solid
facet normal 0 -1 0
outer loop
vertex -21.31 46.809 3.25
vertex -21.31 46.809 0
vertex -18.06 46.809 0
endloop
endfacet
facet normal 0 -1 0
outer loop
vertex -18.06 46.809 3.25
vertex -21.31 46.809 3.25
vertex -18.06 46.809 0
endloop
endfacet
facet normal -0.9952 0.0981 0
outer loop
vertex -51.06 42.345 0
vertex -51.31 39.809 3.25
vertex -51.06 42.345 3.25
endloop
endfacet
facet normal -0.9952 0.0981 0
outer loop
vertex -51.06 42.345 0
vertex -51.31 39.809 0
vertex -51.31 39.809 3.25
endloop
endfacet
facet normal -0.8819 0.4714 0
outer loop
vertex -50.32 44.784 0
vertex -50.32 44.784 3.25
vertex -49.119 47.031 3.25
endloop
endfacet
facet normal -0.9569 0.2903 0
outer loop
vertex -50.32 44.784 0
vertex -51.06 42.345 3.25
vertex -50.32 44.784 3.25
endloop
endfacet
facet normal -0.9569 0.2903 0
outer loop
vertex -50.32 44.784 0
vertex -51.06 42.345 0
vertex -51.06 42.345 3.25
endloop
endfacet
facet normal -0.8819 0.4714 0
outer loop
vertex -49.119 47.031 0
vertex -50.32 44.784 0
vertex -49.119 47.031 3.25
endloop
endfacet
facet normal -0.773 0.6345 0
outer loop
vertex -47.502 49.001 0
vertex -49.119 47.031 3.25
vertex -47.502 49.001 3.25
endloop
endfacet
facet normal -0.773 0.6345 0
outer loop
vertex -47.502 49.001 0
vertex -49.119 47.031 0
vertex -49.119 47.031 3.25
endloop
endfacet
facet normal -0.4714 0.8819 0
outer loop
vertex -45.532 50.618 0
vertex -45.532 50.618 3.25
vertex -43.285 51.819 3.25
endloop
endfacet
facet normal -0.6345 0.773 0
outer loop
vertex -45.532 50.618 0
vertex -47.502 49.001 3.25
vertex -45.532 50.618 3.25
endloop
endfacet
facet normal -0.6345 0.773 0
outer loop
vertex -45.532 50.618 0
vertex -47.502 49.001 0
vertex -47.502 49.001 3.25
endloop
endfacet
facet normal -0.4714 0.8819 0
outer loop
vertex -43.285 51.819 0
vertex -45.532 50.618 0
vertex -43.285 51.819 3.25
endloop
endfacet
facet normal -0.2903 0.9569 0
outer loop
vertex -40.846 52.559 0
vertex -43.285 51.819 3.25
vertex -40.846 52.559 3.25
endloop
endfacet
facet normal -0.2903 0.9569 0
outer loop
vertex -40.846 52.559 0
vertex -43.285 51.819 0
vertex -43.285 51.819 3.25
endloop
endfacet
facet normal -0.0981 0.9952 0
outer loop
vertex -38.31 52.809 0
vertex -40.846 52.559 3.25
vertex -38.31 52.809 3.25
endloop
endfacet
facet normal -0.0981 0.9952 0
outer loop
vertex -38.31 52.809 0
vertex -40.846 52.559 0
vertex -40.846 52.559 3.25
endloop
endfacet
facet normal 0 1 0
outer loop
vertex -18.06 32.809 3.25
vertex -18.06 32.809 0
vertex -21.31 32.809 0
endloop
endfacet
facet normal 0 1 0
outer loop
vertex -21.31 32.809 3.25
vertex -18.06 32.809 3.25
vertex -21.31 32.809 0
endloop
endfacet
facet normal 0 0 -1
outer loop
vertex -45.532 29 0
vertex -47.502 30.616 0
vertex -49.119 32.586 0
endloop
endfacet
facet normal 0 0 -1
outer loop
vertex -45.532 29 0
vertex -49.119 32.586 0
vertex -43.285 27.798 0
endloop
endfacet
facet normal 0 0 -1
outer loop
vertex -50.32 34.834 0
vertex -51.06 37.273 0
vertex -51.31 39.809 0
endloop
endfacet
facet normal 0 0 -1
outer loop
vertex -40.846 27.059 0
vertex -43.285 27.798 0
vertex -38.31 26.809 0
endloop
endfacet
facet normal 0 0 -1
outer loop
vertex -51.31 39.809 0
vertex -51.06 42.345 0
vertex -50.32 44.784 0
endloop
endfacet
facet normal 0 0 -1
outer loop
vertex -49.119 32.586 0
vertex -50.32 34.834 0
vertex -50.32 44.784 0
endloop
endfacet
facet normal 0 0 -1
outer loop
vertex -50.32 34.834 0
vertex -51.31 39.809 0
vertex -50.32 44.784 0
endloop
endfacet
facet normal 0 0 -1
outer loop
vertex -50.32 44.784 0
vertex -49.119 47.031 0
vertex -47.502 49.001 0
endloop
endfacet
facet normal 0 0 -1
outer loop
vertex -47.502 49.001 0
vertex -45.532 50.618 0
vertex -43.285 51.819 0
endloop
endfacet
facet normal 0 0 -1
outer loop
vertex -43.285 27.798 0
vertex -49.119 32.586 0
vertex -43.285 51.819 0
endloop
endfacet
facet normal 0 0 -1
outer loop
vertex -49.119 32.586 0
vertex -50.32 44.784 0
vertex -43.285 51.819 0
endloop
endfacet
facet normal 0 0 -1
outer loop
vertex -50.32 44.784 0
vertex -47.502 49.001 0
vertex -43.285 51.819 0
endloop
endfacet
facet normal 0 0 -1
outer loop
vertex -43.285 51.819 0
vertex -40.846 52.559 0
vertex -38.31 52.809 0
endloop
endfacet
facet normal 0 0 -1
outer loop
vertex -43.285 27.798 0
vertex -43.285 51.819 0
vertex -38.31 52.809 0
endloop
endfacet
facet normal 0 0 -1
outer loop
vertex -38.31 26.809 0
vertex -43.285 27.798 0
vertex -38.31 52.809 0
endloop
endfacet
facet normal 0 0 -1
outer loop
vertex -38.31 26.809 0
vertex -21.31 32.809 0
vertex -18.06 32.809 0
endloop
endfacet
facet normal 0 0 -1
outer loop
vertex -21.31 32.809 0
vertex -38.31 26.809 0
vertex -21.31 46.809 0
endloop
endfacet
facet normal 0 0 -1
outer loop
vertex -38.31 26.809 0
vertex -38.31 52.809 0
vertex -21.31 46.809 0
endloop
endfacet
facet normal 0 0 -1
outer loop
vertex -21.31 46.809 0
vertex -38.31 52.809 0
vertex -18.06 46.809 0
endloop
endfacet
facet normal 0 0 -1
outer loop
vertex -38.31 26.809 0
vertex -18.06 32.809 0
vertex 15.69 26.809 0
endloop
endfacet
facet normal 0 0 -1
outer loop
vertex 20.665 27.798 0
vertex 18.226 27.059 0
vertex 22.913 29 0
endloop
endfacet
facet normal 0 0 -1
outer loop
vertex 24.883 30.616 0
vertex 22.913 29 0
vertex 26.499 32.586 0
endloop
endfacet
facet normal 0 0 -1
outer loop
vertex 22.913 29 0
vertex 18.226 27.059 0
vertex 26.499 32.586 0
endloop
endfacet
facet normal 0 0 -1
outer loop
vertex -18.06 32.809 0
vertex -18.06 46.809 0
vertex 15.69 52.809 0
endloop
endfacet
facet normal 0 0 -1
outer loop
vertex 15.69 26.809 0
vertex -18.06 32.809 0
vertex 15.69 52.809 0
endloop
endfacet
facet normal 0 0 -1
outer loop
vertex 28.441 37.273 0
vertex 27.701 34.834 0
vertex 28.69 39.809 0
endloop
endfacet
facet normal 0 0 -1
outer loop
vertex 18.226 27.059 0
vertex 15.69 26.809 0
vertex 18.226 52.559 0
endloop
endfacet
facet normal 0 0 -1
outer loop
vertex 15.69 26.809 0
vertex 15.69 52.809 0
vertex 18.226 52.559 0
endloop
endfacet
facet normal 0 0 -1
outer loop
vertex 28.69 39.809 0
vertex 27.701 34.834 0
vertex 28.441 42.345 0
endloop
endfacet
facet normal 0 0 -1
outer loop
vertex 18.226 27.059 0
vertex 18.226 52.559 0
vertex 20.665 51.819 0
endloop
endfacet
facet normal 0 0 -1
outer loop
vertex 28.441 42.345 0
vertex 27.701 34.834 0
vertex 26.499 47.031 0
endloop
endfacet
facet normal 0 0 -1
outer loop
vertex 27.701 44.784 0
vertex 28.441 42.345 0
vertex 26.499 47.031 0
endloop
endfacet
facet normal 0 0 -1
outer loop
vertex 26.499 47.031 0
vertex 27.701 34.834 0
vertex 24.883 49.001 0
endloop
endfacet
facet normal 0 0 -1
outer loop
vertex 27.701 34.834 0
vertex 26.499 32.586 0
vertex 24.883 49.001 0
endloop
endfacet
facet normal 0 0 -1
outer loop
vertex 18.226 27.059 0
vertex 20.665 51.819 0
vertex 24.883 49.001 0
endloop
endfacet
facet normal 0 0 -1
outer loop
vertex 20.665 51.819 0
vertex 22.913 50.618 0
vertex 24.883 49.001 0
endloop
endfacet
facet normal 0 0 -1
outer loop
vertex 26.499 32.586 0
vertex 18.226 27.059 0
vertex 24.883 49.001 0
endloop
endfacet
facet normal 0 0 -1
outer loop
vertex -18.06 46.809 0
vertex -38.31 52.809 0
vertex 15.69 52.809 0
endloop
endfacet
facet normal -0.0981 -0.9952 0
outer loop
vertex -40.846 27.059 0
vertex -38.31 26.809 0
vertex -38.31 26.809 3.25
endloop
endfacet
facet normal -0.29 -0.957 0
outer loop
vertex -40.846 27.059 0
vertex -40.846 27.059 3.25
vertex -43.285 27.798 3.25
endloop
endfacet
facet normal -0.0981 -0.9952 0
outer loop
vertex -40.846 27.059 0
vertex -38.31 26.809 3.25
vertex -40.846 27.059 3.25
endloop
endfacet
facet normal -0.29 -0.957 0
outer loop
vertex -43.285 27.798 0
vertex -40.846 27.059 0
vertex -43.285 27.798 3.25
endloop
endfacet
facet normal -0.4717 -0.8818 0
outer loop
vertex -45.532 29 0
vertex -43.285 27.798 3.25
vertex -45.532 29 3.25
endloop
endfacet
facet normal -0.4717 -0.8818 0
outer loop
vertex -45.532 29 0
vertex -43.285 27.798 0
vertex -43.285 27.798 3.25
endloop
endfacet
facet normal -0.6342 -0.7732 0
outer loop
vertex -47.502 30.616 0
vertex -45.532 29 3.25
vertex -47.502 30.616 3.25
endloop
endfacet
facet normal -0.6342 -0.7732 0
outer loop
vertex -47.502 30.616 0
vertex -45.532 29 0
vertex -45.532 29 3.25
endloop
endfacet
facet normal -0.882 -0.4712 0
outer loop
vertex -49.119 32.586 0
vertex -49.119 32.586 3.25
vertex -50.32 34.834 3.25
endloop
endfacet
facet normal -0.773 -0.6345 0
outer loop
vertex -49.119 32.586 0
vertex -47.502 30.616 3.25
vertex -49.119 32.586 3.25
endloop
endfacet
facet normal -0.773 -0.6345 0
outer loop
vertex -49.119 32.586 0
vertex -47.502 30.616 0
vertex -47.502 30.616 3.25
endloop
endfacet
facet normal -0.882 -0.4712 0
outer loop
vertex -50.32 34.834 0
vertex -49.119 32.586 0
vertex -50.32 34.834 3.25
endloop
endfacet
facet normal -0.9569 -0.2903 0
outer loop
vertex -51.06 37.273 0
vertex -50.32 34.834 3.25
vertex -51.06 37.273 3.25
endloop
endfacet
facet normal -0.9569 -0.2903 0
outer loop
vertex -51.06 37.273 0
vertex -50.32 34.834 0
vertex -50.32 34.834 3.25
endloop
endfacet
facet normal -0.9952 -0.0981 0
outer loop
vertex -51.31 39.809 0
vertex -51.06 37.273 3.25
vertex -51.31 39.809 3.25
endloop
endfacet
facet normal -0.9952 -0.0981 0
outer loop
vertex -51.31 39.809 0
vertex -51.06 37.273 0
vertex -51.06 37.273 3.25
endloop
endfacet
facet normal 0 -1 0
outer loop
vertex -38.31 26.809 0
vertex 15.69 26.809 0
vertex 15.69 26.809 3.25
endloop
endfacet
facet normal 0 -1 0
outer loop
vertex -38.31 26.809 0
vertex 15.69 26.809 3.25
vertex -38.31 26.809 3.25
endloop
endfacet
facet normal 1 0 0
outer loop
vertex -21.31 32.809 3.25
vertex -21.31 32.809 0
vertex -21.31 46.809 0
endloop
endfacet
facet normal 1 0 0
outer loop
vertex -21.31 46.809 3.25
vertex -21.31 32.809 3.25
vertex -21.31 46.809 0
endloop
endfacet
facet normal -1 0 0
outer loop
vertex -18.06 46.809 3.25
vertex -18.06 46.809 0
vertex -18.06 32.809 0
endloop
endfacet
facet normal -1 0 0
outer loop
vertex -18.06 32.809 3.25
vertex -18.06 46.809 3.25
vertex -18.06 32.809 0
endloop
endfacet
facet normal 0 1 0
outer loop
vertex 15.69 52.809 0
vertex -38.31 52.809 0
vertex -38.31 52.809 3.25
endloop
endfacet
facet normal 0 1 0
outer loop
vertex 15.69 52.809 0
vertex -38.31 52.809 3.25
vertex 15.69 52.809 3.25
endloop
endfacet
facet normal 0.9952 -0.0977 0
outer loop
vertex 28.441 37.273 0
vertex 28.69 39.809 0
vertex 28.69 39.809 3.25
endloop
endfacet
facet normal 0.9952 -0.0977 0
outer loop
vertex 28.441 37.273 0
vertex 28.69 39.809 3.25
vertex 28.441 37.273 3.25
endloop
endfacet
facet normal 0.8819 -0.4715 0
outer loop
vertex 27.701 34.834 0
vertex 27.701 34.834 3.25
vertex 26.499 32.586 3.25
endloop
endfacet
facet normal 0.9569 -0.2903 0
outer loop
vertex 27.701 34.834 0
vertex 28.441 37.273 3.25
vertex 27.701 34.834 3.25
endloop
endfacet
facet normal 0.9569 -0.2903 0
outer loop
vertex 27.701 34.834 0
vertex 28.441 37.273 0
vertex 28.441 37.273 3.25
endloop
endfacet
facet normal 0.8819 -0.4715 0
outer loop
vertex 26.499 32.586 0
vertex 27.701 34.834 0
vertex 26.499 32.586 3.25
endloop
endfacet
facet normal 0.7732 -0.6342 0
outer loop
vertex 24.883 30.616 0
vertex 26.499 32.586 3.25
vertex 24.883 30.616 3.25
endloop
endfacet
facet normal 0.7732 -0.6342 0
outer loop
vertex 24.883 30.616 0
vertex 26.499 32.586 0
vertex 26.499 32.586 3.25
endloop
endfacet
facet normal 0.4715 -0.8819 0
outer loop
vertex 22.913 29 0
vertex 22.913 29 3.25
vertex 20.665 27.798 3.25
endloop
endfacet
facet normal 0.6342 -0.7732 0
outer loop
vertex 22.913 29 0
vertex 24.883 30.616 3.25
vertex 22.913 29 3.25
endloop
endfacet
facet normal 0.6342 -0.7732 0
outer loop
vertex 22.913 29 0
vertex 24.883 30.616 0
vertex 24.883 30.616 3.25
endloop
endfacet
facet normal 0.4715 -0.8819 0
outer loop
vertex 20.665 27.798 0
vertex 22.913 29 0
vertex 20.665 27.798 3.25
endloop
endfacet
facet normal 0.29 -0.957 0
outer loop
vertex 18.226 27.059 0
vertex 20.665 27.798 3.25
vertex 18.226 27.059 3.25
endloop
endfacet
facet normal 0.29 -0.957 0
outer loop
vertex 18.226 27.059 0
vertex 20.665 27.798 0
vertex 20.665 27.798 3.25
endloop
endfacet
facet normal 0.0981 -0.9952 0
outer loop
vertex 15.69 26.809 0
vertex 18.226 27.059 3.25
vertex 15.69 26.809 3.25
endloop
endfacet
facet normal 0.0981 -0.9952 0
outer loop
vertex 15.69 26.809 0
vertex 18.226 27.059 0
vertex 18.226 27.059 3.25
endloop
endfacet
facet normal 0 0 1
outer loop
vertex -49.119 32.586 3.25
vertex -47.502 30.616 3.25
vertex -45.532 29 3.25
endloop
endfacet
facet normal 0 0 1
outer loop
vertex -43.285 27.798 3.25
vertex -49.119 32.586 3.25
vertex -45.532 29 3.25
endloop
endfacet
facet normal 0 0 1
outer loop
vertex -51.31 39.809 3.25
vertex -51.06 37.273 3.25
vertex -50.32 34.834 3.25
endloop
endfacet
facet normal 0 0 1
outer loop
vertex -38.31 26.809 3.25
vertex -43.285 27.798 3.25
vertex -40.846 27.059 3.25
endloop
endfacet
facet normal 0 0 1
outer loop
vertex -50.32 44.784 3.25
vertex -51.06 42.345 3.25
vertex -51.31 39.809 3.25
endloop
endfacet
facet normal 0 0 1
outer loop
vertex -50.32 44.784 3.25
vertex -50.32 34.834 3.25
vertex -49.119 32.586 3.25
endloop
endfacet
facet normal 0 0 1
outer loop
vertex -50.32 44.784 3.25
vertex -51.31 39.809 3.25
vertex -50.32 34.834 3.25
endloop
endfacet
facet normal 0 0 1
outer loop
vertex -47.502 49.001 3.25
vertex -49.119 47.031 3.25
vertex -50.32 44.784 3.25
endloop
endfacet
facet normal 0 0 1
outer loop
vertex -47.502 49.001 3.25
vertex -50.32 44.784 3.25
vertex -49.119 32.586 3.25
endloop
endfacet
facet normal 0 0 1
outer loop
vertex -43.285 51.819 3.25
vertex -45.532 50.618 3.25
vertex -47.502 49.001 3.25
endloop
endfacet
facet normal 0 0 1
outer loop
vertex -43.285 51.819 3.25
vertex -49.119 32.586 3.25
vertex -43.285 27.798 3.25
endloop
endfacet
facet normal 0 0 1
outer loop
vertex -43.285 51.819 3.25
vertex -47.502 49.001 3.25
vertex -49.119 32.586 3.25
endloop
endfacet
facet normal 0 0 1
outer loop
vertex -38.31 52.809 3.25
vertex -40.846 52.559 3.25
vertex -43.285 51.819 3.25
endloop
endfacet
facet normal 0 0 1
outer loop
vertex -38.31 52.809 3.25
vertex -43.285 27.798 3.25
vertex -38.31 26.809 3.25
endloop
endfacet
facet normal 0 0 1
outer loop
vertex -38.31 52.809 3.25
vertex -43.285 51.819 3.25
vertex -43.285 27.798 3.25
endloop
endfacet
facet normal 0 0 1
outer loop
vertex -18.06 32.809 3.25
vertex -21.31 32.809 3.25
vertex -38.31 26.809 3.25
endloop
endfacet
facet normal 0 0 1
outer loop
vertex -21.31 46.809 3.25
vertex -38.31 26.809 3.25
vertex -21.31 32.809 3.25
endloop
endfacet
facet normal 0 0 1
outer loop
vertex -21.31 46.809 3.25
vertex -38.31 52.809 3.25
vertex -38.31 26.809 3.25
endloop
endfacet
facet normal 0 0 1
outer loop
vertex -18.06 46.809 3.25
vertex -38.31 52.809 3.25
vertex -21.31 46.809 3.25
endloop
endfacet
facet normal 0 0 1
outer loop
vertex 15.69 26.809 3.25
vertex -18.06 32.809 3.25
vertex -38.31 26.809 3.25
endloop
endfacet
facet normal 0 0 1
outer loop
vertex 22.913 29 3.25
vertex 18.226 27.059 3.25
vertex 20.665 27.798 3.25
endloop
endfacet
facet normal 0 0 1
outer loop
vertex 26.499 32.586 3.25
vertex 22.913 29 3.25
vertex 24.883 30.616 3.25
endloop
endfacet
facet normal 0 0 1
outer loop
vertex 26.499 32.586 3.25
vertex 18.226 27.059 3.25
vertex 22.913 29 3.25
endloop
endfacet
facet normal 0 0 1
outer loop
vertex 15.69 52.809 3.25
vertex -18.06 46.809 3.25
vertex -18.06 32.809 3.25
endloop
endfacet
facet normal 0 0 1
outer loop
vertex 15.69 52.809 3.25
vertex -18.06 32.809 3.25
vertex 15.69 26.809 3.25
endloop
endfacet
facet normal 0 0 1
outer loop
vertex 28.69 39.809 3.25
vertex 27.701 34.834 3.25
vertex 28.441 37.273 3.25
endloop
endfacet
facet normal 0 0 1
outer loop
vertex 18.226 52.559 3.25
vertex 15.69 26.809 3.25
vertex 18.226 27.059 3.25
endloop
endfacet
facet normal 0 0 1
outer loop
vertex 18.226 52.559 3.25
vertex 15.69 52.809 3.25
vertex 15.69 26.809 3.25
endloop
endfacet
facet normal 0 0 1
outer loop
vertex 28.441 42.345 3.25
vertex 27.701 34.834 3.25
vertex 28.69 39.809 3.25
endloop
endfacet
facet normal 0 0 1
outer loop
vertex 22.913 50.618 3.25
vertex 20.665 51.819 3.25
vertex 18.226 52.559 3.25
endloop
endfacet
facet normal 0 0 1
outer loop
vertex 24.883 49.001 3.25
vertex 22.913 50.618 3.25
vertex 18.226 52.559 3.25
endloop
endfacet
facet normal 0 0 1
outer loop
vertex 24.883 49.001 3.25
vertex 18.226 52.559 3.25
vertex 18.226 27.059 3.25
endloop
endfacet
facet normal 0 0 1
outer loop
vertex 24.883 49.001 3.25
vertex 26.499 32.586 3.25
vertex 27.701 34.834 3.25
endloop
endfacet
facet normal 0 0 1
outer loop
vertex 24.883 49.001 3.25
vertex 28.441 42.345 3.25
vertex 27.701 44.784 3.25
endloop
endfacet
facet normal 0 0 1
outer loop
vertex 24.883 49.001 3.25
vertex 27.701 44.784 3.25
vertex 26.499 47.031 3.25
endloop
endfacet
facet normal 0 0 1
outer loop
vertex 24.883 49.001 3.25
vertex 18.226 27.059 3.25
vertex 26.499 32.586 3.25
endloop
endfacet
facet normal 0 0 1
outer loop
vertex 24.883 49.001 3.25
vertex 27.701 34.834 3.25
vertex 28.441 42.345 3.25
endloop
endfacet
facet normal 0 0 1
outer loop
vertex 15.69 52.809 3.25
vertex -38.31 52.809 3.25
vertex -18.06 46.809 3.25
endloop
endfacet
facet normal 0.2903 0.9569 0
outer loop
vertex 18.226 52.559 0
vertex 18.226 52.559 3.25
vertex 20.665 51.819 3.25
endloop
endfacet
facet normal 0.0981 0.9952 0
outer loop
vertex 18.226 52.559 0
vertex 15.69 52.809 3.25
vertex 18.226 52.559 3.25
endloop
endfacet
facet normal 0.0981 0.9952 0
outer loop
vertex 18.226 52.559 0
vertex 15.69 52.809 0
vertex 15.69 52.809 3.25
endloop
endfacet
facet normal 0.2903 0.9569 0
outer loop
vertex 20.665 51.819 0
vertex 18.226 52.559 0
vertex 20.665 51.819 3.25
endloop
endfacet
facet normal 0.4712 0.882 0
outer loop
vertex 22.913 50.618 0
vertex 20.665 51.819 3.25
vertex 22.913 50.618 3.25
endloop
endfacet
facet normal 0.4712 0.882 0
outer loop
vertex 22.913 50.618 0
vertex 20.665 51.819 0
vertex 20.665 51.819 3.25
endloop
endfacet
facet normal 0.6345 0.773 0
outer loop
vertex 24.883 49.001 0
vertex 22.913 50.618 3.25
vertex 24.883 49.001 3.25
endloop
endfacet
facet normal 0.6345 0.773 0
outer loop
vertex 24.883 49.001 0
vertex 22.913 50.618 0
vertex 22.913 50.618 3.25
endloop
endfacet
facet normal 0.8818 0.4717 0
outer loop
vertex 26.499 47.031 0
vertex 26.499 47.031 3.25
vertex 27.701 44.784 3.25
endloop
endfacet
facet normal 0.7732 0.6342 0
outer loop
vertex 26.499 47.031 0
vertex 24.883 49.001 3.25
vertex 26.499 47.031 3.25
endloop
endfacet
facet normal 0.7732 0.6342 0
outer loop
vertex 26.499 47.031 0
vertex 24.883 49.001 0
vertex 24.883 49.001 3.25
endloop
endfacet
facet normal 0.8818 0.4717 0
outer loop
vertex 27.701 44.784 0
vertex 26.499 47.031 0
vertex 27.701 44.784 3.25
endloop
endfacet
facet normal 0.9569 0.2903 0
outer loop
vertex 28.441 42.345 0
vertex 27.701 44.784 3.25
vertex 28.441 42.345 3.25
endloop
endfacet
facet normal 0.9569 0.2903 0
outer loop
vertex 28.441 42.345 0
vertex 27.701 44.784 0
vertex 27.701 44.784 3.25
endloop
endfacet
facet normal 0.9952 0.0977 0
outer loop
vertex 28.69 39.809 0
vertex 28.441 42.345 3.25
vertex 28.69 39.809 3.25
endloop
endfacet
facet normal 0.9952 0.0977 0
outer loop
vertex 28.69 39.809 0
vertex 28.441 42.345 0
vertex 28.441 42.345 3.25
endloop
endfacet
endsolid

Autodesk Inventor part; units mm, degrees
ref_plane "YZ Plane" through (0, 0, 0) normal (1, 0, 0) x (0, 1, 0)
ref_plane "XZ Plane" through (0, 0, 0) normal (0, 1, 0) x (-1, 0, 0)
ref_plane "XY Plane" through (0, 0, 0) normal (0, 0, 1) x (1, 0, 0)
sketch "Block1" plane through (0, 0, 0) normal (0, 0, 1) x (1, 0, 0)
  circle A0 centre (74.029, 24.2723) radius 1
  line L0 (49.279, 30.4723) -> (71.779, 30.4723)
  line L1 (71.779, 30.4723) -> (71.779, 18.0723)
  line L2 (71.779, 18.0723) -> (49.279, 18.0723)
  line L3 (49.279, 18.0723) -> (49.279, 30.4723)
  line L4 (49.279, 30.4723) -> (44.779, 30.4723)
  line L5 (44.779, 30.4723) -> (44.779, 18.0723)
  line L6 (44.779, 18.0723) -> (49.279, 18.0723)
  line L7 (49.279, 18.0723) -> (49.279, 30.4723)
  line L8 (71.779, 30.4723) -> (76.279, 30.4723)
  line L9 (76.279, 30.4723) -> (76.279, 18.0723)
  line L10 (76.279, 18.0723) -> (71.779, 18.0723)
  line L11 (71.779, 18.0723) -> (71.779, 30.4723)
  line L12 (44.779, 24.2723) -> (76.279, 24.2723) construction
  line L13 (47.029, 30.4723) -> (47.029, 18.0723) construction
  circle A1 centre (47.029, 24.2723) radius 1
  line L14 (74.029, 30.4723) -> (74.029, 18.0723) construction
  point P0 (60.979, 24.0984)
  dimension "d7" = 22.5
  dimension "d8" = 12.4
  dimension "d9" = 4.5
  dimension "d10" = 4.5
  dimension "d11" = 2
  dimension "d12" = 2
sketch "Sketch1" plane through (0, 0, 0) normal (0, 0, 1) x (1, 0, 0)
  line L0 (-92.7646, -8.503) -> (-89.7646, -8.503)
  line L1 (-89.7646, -8.503) -> (-89.7646, -11.753)
  line L2 (-89.7646, -11.753) -> (-92.7646, -11.753)
  line L3 (-92.7646, -11.753) -> (-92.7646, -8.503)
  line L4 (-92.7646, -21.6527) -> (-89.7646, -21.6527)
  line L5 (-89.7646, -21.6527) -> (-89.7646, -21.7527)
  line L6 (-89.7646, -21.7527) -> (-92.7646, -21.7527)
  line L7 (-92.7646, -21.7527) -> (-92.7646, -21.6527)
  line L8 (-51.3097, 52.8088) -> (28.6903, 52.8088)
  line L9 (28.6903, 52.8088) -> (28.6903, 26.8088)
  line L10 (28.6903, 26.8088) -> (-51.3097, 26.8088)
  line L11 (-51.3097, 26.8088) -> (-51.3097, 52.8088)
  line L12 (-51.3097, 39.8088) -> (28.6903, 39.8088) construction
  line L13 (-21.3097, 46.8088) -> (-18.0597, 46.8088)
  line L14 (-18.0597, 46.8088) -> (-18.0597, 32.8088)
  line L15 (-18.0597, 32.8088) -> (-21.3097, 32.8088)
  line L16 (-21.3097, 32.8088) -> (-21.3097, 46.8088)
  line L17 (-21.3097, 39.8088) -> (-18.0597, 39.8088) construction
  line L18 (-38.3097, 52.8088) -> (-38.3097, 26.8088) construction
  arc A0 (-38.3097, 52.8088) -> (-38.3097, 26.8088) centre (-38.3097, 39.8088) ccw
  line L19 (-11.3097, 52.8088) -> (-11.3097, 26.8088) construction
  line L20 (15.6903, 52.8088) -> (15.6903, 26.8088) construction
  arc A1 (15.6903, 26.8088) -> (15.6903, 52.8088) centre (15.6903, 39.8088) ccw
  point P0 (0, 0)
  dimension "d0" = 3
  dimension "mat" = 3.25
  dimension "d2" = 3
  dimension "d3" = 0.1
  dimension "d23" = 80
  dimension "d24" = 26
  dimension "d29" = 3.25
  dimension "d30" = 14
  dimension "d31" = 30
  dimension "d38" = 13
  dimension "d39" = 13
extrude "Extrusion6" add sketch "Sketch1" along normal blind 3.25 contours L8 A1 L10 A0
equation "\"d29\" = mat"
equation "\"d42\" = mat"
properties part number "arm-servo"
